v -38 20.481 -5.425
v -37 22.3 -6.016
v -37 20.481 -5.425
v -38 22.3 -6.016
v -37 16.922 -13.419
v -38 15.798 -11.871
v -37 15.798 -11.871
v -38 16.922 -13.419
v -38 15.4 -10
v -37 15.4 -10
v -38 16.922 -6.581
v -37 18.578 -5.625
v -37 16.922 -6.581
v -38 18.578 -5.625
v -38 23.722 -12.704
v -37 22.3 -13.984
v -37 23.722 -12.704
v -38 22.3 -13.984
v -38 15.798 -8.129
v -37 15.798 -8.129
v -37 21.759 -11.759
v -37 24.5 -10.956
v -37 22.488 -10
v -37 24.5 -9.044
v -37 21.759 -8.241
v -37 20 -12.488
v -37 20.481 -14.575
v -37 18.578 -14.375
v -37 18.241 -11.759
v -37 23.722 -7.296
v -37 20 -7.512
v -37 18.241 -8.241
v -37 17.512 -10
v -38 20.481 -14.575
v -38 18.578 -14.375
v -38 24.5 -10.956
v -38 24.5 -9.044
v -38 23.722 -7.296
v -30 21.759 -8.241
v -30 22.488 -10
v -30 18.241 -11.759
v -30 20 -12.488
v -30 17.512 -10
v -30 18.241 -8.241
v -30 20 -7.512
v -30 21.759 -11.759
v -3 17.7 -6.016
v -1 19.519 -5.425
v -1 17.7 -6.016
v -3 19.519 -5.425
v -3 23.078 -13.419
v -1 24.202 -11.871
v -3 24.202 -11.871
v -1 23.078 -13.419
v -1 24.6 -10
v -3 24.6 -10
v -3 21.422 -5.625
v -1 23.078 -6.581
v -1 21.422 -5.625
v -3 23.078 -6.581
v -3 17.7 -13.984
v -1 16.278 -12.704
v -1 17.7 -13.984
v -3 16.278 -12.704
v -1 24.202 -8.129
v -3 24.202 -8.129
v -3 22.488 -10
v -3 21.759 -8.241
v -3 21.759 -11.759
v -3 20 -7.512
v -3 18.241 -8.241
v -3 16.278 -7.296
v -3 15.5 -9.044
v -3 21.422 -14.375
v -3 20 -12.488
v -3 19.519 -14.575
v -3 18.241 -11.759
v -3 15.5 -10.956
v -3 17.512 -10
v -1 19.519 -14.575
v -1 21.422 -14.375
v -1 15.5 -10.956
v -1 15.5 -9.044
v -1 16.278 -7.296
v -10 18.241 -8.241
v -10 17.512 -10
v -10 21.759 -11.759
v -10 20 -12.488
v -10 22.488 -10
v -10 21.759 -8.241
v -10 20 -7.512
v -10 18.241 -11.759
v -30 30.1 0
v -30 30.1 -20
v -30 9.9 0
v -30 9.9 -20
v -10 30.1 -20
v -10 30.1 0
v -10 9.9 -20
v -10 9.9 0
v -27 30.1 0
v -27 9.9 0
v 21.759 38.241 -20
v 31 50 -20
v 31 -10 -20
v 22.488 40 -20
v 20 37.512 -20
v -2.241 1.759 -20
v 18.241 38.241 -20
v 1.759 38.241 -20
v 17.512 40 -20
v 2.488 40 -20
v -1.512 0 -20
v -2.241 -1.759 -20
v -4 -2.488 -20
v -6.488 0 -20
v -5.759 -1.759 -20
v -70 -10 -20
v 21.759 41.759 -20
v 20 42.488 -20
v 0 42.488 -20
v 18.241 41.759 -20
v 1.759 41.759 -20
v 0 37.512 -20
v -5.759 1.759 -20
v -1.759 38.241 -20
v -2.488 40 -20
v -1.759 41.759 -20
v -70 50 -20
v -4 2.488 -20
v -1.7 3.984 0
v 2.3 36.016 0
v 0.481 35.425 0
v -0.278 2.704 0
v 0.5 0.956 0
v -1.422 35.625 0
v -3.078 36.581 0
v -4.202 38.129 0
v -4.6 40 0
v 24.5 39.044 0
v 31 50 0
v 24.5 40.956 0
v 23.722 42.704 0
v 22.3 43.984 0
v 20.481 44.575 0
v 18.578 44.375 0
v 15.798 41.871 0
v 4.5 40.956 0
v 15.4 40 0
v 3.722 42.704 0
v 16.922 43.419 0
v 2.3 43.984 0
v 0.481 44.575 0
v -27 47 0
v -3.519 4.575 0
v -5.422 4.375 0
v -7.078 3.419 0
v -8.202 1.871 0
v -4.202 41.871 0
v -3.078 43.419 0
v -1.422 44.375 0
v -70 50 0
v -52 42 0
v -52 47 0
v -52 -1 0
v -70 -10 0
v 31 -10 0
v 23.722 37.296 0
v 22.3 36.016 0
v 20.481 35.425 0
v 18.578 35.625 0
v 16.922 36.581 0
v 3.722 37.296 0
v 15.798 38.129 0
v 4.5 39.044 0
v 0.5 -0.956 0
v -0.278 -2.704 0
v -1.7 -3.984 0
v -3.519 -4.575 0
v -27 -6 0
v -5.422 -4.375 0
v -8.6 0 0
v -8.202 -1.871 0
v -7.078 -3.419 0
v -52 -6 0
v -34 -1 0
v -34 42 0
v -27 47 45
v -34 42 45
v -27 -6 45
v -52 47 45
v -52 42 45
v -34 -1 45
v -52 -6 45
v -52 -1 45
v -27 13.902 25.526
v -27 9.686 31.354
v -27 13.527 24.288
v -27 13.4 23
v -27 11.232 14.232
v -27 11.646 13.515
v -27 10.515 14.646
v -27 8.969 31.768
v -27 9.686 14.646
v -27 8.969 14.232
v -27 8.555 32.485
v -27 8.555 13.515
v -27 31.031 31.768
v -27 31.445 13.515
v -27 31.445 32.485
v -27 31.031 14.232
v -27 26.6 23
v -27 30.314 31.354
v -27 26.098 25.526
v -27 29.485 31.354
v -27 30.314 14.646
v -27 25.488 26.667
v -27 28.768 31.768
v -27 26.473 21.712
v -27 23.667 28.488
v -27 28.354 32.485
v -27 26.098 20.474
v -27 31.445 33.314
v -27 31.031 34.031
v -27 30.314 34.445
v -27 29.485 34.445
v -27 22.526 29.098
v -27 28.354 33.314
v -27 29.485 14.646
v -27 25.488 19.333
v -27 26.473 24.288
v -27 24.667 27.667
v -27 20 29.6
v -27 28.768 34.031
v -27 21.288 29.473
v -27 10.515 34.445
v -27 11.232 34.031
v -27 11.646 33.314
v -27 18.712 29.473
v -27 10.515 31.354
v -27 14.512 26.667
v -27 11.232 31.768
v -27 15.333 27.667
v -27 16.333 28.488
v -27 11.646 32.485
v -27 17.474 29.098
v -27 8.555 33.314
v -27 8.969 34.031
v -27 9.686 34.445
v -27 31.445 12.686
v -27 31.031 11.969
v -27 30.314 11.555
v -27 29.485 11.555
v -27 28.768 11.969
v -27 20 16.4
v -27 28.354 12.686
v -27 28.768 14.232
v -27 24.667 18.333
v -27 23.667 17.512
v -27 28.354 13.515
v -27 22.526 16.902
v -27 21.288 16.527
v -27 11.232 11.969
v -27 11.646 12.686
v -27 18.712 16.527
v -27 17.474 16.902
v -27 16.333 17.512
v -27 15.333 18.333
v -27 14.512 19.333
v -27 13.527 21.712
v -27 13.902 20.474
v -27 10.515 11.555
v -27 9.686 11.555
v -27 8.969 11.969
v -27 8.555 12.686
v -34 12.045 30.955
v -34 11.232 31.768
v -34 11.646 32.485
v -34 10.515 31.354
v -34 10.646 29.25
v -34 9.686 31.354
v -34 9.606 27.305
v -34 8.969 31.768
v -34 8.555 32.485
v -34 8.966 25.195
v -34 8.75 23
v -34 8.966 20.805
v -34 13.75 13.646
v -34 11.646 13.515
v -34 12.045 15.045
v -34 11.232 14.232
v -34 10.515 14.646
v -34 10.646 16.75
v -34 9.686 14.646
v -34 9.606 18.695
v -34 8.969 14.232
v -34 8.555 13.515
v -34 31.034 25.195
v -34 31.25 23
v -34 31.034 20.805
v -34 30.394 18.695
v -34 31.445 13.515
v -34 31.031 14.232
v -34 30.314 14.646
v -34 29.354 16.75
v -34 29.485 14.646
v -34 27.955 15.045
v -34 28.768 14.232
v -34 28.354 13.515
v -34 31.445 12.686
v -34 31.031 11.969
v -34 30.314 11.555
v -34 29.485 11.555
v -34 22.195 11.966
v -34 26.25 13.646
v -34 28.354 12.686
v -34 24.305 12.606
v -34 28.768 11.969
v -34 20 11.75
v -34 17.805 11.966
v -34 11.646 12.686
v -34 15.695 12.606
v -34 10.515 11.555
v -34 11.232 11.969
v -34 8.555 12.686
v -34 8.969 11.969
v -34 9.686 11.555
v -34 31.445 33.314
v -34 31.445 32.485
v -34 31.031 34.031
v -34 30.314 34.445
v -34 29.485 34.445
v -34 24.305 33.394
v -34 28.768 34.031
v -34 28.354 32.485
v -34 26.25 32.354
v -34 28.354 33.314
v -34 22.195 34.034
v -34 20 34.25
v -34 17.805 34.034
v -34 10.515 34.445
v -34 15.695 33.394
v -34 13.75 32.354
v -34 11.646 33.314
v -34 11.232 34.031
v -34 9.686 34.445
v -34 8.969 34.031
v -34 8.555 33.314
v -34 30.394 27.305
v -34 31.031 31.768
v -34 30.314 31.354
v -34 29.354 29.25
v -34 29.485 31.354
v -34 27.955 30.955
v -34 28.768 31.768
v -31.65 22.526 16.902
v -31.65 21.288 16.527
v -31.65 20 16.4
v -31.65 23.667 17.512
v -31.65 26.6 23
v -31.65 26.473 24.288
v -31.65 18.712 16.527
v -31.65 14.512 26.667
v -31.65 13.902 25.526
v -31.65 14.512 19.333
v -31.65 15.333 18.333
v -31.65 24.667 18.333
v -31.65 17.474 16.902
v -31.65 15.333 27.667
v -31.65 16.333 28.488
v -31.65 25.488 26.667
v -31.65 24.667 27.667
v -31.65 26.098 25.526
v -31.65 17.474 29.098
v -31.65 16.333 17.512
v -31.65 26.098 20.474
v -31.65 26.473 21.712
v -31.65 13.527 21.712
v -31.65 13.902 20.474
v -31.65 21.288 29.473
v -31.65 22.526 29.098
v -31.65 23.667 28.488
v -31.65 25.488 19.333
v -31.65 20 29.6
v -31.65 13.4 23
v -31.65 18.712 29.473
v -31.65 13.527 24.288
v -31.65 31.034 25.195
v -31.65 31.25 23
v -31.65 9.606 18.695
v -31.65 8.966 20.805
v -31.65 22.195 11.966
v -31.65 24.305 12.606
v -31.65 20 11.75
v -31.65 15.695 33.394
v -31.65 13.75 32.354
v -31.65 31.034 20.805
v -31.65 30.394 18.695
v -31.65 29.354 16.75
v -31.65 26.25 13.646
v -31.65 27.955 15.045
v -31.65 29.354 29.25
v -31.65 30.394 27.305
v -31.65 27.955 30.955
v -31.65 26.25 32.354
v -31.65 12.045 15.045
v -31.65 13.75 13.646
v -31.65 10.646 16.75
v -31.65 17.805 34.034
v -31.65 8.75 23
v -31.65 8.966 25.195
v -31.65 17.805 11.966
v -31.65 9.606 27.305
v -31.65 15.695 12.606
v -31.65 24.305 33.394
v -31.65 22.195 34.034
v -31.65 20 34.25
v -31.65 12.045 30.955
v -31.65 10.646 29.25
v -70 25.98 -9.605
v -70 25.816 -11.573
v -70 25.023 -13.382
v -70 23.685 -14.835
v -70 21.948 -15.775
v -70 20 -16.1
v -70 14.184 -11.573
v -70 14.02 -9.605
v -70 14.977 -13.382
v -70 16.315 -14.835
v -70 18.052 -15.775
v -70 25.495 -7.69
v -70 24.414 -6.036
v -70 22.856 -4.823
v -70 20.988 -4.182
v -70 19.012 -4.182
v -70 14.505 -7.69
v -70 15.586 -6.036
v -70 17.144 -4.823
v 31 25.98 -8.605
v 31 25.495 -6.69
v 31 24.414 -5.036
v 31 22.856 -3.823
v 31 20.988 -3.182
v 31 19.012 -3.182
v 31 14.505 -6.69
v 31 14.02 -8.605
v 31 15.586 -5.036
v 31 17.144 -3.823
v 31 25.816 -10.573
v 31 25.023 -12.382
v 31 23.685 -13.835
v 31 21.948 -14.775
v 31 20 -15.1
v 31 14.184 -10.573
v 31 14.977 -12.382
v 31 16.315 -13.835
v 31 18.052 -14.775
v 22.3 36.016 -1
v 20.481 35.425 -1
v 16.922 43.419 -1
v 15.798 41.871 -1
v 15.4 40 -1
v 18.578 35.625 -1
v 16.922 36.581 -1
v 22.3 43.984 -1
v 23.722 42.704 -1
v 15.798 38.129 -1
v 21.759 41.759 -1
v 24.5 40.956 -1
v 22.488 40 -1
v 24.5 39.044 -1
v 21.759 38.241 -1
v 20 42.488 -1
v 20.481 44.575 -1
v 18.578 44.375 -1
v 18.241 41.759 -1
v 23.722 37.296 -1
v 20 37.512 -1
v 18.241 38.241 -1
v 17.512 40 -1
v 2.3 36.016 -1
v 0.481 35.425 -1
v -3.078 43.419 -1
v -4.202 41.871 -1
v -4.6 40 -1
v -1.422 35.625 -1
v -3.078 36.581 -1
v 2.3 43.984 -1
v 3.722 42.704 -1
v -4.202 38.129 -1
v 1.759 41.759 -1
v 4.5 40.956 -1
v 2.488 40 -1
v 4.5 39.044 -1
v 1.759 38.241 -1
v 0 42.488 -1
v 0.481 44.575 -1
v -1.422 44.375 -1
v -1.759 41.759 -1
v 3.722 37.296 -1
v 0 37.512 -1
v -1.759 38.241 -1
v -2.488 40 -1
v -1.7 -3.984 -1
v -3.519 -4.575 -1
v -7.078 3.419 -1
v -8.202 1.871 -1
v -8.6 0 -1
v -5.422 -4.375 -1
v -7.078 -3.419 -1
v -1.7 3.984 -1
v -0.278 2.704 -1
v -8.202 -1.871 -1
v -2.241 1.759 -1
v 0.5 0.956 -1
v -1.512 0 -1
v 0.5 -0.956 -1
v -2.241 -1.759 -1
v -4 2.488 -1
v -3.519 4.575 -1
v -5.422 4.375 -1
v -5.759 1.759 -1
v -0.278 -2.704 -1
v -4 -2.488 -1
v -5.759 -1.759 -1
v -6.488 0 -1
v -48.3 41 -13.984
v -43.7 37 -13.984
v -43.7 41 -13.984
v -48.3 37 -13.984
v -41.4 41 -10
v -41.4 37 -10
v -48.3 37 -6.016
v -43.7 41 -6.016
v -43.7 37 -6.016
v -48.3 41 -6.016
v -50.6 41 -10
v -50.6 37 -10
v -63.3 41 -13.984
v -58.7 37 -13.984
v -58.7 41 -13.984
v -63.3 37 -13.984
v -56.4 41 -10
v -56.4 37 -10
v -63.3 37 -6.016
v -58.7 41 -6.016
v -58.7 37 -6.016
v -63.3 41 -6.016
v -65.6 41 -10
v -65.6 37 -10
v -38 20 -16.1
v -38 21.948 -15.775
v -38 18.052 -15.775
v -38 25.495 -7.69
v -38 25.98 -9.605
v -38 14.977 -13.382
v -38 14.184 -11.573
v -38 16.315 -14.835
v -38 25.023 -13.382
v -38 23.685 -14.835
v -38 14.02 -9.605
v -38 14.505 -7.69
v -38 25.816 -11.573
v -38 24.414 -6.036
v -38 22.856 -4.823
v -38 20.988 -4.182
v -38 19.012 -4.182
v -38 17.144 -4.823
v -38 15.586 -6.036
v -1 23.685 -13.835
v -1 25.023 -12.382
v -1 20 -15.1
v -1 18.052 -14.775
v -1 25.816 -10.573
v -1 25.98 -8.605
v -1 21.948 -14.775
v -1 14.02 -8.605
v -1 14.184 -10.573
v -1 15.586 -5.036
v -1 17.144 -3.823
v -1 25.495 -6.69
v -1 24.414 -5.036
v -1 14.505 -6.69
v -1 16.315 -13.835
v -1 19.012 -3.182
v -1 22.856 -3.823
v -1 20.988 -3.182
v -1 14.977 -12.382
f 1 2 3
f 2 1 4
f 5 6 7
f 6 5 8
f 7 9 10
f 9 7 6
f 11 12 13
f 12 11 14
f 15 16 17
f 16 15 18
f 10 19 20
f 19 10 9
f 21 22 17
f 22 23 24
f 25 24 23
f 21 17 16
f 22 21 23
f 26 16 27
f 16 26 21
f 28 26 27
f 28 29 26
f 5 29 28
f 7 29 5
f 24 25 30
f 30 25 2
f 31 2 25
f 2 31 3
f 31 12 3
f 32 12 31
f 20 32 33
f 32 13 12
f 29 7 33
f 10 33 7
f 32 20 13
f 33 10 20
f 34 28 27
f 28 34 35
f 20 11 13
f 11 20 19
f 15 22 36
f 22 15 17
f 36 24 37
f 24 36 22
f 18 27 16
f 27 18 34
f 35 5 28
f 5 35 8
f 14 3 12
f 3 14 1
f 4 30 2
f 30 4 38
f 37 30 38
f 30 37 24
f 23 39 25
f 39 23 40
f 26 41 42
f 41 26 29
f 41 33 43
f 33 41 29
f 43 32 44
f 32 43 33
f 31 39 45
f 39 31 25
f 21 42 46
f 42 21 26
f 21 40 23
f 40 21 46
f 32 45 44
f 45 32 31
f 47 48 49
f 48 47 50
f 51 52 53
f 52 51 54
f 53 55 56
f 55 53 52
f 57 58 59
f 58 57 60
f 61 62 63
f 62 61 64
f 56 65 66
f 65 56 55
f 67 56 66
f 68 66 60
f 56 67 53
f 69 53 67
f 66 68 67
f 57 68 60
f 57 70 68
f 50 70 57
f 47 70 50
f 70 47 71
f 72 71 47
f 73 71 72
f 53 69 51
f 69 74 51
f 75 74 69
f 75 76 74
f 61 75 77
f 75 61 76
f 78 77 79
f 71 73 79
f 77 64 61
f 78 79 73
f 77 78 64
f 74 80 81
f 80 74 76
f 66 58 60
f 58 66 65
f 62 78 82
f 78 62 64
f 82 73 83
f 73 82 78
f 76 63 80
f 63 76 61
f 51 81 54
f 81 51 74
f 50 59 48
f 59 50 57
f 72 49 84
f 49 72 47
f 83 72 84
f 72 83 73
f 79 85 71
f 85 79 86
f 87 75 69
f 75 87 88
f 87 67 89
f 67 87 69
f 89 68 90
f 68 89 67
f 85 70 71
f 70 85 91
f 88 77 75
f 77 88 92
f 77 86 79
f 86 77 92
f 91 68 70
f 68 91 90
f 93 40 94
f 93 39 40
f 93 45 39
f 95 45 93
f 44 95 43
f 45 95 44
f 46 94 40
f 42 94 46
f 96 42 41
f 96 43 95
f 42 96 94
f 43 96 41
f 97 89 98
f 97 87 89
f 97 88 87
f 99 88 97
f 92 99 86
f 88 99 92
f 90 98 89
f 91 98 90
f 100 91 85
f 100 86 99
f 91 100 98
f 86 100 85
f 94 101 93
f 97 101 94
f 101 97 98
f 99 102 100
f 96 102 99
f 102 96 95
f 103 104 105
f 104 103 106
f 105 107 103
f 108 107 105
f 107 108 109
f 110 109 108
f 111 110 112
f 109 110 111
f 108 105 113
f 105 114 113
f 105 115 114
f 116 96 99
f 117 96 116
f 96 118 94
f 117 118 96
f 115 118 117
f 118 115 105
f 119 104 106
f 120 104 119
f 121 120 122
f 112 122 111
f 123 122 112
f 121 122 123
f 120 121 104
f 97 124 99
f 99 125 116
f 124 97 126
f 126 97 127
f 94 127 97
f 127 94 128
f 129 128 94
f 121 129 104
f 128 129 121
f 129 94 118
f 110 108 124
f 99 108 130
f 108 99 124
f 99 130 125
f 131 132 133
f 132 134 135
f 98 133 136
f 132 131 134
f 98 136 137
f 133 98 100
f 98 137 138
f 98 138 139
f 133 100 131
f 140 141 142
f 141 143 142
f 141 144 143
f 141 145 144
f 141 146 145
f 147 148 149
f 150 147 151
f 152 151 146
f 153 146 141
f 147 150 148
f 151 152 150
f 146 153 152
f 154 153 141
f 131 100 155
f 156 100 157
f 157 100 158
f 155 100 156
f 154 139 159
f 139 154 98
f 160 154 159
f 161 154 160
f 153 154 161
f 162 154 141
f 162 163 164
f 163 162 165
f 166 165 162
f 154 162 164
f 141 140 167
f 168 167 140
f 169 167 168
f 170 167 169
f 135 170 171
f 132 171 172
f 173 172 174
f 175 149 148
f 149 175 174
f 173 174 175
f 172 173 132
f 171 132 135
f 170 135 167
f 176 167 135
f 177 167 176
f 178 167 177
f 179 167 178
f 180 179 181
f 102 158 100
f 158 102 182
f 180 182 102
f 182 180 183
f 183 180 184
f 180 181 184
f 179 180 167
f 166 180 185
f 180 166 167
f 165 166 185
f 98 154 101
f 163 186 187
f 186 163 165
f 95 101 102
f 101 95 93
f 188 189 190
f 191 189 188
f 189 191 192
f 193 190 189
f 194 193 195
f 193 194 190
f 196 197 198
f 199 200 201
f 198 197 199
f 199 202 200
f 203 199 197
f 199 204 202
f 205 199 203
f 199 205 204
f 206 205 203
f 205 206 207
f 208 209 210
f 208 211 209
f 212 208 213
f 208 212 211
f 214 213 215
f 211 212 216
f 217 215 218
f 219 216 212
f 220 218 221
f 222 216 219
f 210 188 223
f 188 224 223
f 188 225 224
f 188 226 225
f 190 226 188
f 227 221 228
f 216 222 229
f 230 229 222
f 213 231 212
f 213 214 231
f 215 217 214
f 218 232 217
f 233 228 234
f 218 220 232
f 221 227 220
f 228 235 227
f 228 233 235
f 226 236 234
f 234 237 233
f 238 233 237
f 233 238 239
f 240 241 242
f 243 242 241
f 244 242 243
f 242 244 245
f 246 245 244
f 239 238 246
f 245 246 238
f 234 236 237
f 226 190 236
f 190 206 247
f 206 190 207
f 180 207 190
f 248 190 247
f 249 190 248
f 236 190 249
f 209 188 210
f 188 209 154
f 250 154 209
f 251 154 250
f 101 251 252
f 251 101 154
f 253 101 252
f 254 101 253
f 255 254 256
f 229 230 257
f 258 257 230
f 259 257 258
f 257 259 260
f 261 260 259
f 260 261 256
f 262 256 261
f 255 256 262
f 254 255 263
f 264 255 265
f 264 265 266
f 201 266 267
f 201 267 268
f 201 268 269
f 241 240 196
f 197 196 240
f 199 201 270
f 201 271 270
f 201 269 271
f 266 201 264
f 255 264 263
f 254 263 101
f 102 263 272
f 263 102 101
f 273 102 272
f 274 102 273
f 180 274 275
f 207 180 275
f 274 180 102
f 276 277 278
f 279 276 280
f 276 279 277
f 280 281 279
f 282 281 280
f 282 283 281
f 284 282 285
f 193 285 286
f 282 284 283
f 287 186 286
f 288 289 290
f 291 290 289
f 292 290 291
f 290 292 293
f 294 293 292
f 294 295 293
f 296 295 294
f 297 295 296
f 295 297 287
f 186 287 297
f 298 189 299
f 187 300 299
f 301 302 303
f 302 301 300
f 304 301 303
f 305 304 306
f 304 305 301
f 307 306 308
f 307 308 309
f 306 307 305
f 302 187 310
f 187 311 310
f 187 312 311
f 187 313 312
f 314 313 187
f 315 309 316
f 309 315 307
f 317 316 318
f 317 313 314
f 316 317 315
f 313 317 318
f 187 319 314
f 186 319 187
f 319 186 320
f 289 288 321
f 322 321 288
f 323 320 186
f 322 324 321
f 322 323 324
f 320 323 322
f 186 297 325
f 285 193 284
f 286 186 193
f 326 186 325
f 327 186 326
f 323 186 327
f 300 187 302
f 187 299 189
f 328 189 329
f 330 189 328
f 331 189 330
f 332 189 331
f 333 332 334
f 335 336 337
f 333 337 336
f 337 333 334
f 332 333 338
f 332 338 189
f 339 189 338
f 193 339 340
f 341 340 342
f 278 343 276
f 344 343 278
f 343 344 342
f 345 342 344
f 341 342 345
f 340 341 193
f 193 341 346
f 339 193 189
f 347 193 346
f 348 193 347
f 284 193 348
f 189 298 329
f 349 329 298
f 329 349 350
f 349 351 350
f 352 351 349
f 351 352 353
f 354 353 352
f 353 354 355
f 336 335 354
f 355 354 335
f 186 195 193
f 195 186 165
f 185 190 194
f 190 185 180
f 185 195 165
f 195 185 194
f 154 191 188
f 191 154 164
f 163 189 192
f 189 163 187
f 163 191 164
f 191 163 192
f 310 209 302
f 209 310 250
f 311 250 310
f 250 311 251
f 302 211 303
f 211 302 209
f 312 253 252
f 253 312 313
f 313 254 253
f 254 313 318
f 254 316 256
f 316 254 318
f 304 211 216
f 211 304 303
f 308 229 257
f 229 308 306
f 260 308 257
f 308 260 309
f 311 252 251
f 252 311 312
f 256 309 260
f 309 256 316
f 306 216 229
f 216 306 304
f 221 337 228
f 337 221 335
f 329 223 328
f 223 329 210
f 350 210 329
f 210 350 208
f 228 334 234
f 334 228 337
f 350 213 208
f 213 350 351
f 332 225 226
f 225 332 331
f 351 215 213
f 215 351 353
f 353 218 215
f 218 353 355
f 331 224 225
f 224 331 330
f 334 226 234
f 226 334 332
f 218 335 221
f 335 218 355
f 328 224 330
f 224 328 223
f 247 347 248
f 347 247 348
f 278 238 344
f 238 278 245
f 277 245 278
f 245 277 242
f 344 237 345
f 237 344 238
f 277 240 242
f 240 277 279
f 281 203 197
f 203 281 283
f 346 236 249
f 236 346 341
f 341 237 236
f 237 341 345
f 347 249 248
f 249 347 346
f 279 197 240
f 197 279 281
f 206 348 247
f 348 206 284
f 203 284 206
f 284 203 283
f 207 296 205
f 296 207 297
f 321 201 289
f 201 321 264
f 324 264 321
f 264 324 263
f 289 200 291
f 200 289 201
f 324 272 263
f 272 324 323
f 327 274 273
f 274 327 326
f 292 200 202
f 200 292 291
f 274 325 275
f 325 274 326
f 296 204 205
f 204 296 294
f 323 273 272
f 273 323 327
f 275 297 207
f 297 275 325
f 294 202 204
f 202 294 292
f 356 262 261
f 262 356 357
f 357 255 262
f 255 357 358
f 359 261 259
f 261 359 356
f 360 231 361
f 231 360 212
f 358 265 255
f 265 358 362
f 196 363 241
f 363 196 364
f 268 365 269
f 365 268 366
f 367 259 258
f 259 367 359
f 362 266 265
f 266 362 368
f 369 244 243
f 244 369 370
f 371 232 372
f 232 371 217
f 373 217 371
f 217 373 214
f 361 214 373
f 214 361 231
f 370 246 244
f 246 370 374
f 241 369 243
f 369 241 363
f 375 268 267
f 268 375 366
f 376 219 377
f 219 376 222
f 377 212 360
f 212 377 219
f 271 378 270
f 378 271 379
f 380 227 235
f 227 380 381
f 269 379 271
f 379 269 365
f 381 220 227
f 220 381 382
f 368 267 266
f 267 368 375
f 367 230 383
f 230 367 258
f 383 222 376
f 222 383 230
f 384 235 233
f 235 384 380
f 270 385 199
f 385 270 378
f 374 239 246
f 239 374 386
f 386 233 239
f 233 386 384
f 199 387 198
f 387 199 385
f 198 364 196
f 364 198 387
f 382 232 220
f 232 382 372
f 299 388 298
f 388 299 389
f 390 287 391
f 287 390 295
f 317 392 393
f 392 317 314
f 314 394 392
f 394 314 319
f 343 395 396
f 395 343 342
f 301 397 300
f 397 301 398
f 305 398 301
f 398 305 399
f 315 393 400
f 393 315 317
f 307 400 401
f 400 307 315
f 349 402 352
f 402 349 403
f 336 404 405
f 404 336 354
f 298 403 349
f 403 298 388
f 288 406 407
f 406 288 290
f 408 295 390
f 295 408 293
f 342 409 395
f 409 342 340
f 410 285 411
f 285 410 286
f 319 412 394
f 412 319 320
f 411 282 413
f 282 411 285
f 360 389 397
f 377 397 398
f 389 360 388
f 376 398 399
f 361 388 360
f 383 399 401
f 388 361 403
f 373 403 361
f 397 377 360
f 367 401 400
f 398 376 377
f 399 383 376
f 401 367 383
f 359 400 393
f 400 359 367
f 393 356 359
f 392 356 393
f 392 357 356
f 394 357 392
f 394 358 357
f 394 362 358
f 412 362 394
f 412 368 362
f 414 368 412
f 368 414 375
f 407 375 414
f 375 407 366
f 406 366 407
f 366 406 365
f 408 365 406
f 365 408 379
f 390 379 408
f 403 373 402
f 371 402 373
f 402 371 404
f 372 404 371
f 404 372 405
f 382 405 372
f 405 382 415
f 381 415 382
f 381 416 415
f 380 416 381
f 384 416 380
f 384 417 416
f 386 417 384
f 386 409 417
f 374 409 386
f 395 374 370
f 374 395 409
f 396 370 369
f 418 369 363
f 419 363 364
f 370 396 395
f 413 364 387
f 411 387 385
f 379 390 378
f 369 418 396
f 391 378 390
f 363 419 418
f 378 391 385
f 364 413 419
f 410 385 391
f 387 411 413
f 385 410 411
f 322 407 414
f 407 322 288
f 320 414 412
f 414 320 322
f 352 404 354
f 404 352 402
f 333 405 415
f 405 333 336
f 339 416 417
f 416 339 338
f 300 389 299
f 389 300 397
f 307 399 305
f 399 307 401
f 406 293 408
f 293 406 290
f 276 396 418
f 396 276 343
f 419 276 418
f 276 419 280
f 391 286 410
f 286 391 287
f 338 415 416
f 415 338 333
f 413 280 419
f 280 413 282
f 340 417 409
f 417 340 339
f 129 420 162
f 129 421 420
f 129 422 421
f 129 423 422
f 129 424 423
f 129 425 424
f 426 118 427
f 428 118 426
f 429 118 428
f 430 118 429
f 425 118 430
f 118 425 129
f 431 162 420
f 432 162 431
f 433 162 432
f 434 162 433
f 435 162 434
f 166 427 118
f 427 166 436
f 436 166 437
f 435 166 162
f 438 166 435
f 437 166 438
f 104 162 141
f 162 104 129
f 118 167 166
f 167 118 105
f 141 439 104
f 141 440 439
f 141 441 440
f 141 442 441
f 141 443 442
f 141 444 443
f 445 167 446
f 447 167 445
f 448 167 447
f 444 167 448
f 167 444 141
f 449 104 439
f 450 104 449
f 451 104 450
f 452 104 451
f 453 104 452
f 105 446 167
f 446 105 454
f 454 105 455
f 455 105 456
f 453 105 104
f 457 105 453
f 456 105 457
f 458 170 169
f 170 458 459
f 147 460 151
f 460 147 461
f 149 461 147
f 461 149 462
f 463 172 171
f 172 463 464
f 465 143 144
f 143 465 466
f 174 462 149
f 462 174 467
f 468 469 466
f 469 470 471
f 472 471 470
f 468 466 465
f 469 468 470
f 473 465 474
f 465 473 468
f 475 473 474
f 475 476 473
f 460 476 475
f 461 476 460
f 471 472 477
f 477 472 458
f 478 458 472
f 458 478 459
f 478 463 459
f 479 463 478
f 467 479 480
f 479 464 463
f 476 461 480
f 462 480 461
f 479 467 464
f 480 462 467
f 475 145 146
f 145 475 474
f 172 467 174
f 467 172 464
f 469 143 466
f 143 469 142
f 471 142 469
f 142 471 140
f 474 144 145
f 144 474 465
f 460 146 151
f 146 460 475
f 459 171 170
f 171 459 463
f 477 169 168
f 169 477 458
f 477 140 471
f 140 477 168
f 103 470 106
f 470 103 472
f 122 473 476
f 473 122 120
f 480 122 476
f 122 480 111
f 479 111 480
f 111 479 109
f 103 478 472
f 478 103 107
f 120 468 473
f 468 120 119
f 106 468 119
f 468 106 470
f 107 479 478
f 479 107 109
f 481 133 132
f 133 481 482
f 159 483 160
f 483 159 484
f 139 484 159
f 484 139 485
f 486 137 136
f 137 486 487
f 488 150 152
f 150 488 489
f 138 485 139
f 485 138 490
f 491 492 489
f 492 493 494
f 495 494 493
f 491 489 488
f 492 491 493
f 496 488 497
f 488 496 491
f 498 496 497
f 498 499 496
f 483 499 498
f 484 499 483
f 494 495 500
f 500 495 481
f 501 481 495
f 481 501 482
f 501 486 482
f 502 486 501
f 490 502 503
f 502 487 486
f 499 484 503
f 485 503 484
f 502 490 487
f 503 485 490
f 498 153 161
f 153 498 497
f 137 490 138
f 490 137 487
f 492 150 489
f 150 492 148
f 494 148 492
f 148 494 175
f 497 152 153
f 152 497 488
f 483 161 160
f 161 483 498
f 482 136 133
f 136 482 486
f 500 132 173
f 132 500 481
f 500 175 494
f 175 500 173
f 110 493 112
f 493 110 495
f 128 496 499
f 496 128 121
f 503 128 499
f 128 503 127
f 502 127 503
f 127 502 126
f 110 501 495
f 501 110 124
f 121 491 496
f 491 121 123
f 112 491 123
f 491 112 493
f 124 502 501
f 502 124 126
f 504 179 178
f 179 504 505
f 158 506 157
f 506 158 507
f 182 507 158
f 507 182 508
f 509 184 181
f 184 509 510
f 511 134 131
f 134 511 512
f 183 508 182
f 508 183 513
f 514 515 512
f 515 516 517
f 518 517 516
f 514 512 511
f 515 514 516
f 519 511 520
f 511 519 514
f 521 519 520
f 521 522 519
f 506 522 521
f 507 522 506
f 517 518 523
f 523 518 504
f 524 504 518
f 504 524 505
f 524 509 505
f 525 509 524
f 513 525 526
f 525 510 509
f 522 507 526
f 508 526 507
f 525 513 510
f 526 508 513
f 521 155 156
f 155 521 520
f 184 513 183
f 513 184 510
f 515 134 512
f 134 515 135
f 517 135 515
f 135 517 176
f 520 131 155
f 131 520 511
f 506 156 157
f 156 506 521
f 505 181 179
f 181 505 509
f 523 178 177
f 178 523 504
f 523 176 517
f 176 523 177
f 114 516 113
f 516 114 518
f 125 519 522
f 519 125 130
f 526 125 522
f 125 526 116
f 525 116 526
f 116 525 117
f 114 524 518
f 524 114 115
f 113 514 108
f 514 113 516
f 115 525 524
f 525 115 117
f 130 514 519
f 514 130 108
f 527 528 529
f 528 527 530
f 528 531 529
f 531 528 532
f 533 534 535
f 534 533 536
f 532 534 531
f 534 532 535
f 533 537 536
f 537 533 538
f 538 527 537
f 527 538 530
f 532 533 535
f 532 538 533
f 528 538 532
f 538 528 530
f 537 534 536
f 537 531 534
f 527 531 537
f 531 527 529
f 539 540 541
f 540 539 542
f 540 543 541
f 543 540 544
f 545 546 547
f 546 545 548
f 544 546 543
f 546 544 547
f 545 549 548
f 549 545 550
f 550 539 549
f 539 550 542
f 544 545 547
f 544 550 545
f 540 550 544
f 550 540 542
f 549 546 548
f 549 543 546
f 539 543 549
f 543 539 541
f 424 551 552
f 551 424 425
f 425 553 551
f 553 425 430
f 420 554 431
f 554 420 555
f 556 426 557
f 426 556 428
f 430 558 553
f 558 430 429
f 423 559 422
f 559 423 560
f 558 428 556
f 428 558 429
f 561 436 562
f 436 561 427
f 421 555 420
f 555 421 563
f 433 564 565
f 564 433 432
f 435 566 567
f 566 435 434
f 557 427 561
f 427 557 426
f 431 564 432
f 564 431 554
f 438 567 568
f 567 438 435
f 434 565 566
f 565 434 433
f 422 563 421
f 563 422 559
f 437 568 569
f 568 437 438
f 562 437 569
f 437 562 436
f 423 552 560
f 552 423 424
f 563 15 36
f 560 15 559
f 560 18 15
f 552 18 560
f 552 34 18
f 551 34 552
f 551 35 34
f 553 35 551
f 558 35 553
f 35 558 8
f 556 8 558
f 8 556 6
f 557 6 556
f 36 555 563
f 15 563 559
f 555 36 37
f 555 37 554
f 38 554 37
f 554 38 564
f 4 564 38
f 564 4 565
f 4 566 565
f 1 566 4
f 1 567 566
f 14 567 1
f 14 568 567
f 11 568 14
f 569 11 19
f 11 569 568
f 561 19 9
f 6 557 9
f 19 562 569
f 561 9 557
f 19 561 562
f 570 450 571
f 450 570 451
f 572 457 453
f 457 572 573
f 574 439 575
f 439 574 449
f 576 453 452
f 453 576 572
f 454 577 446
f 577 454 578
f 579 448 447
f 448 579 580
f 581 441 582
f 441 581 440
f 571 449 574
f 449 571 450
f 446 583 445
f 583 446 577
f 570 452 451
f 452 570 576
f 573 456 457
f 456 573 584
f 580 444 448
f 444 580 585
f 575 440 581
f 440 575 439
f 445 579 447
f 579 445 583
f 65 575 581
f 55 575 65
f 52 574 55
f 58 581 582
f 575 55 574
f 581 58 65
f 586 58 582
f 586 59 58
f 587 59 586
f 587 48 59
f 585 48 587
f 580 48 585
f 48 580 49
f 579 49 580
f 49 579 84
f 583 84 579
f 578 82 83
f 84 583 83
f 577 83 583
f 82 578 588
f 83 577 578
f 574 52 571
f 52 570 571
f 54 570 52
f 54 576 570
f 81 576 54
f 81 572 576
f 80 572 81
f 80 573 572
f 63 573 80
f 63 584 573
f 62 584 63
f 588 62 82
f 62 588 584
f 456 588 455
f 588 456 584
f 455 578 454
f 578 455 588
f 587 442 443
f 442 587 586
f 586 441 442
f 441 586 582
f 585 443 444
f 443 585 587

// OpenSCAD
// file: MCAD/constants.scad
// MIT license


TAU = 6.2831853071; //2*PI, see http://tauday.com/
PI = TAU/2;

// translates a imperial measurement in inches to meters
mm_per_inch = 25.4;
// file: MCAD/math.scad
// MIT license

include <constants.scad>

function deg(angle) = 360*angle/TAU;
// file: bom.scad
module bom(code, desc, category) {
	echo(str("BOM: ",code," - ", desc, "; ", category));
}
// file: MCAD/shapes.scad
/*
 *  OpenSCAD Shapes Library (www.openscad.org)
 *  Copyright (C) 2009  Catarina Mota
 *  Copyright (C) 2010  Elmo Mäntynen
 *
 *  License: LGPL 2.1 or later
*/

// 2D Shapes
//ngon(sides, radius, center=false);

// 3D Shapes
//box(width, height, depth);
//roundedBox(width, height, depth, factor);
//cone(height, radius);
//ellipticalCylinder(width, height, depth);
//ellipsoid(width, height);
//tube(height, radius, wall, center = false);
//tube2(height, ID, OD, center = false);
//ovalTube(width, height, depth, wall, center = false);
//hexagon(height, depth);
//octagon(height, depth);
//dodecagon(height, depth);
//hexagram(height, depth);
//rightTriangle(adjacent, opposite, depth);
//equiTriangle(side, depth);
//12ptStar(height, depth);

//----------------------

// size is a vector [w, h, d]
module box(width, height, depth) {
  cube([width, height, depth], true);
}

// size is a vector [w, h, d]
module roundedBox(width, height, depth, radius) {
  size=[width, height, depth];
  cube(size - [2*radius,0,0], true);
  cube(size - [0,2*radius,0], true);
  for (x = [radius-size[0]/2, -radius+size[0]/2],
       y = [radius-size[1]/2, -radius+size[1]/2]) {
    translate([x,y,0]) cylinder(r=radius, h=size[2], center=true);
  }
}

module cone(height, radius, center = false) {
  cylinder(height, radius, 0, center);
}

module ellipticalCylinder(w,h, height, center = false) {
  scale([1, h/w, 1]) cylinder(h=height, r=w, center=center);
}

module ellipsoid(w, h, center = false) {
  scale([1, h/w, 1]) sphere(r=w/2, center=center);
}

// wall is wall thickness
module tube(height, radius, wall, center = false) {
  difference() {
    cylinder(h=height, r=radius, center=center);
    cylinder(h=height, r=radius-wall, center=center);
  }
}

// wall is wall thickness
module tube2(height, ID, OD, center = false) {
  difference() {
    cylinder(h=height, r=OD/2, center=center);
    cylinder(h=height, r=ID/2, center=center);
  }
}

// wall is wall thickness
module ovalTube(height, rx, ry, wall, center = false) {
  difference() {
    scale([1, ry/rx, 1]) cylinder(h=height, r=rx, center=center);
    scale([(rx-wall)/rx, (ry-wall)/rx, 1]) cylinder(h=height, r=rx, center=center);
  }
}

// size is the XY plane size, height in Z
module hexagon(size, height) {
  boxWidth = size/1.75;
  for (r = [-60, 0, 60]) rotate([0,0,r]) cube([boxWidth, size, height], true);
}

// size is the XY plane size, height in Z
module octagon(size, height) {
  intersection() {
    cube([size, size, height], true);
    rotate([0,0,45]) cube([size, size, height], true);
  }
}

// size is the XY plane size, height in Z
module dodecagon(size, height) {
  intersection() {
    hexagon(size, height);
    rotate([0,0,90]) hexagon(size, height);
  }
}

// size is the XY plane size, height in Z
module hexagram(size, height) {
  boxWidth=size/1.75;
  for (v = [[0,1],[0,-1],[1,-1]]) {
    intersection() {
      rotate([0,0,60*v[0]]) cube([size, boxWidth, height], true);
      rotate([0,0,60*v[1]]) cube([size, boxWidth, height], true);
    }
  }
}

module rightTriangle(adjacent, opposite, height) {
  difference() {
    translate([-adjacent/2,opposite/2,0]) cube([adjacent, opposite, height], true);
    translate([-adjacent,0,0]) {
      rotate([0,0,atan(opposite/adjacent)]) dislocateBox(adjacent*2, opposite, height+2);
    }
  }
}

module equiTriangle(side, height) {
  difference() {
    translate([-side/2,side/2,0]) cube([side, side, height], true);
    rotate([0,0,30]) dislocateBox(side*2, side, height);
    translate([-side,0,0]) {
      rotate([0,0,60]) dislocateBox(side*2, side, height);
    }
  }
}

module 12ptStar(size, height) {
  starNum = 3;
  starAngle = 360/starNum;
  for (s = [1:starNum]) {
    rotate([0, 0, s*starAngle]) cube([size, size, height], true);
  }
}

//-----------------------
//MOVES THE ROTATION AXIS OF A BOX FROM ITS CENTER TO THE BOTTOM LEFT CORNER
module dislocateBox(w, h, d) {
  translate([0,0,-d/2]) cube([w,h,d]);
}

//-----------------------
// Tests
//module test2D_ellipse(){ellipse(10, 5);}
module test_ellipsoid(){ellipsoid(10, 5);}

//module test2D_egg_outline(){egg_outline();}
// file: MCAD/motors.scad
// Copyright 2010 D1plo1d

// This library is dual licensed under the GPL 3.0 and the GNU Lesser General Public License as per http://creativecommons.org/licenses/LGPL/2.1/ .

include <math.scad>


//generates a motor mount for the specified nema standard #.
module stepper_motor_mount(nema_standard,slide_distance=0, mochup=true, tolerance=0) {
	//dimensions from:
	// http://www.numberfactory.com/NEMA%20Motor%20Dimensions.htm
	if (nema_standard == 17)
	{
		_stepper_motor_mount(
			motor_shaft_diameter = 0.1968*mm_per_inch,
			motor_shaft_length = 0.945*mm_per_inch,
			pilot_diameter = 0.866*mm_per_inch,
			pilot_length = 0.80*mm_per_inch,
			mounting_bolt_circle = 1.725*mm_per_inch,
			bolt_hole_size = 3.5,
			bolt_hole_distance = 1.220*mm_per_inch,
			slide_distance = slide_distance,
			mochup = mochup,
			tolerance=tolerance);
	}
	if (nema_standard == 23)
	{
		_stepper_motor_mount(
			motor_shaft_diameter = 0.250*mm_per_inch,
			motor_shaft_length = 0.81*mm_per_inch,
			pilot_diameter = 1.500*mm_per_inch,
			pilot_length = 0.062*mm_per_inch,
			mounting_bolt_circle = 2.625*mm_per_inch,
			bolt_hole_size = 0.195*mm_per_inch,
			bolt_hole_distance = 1.856*mm_per_inch,
			slide_distance = slide_distance,
			mochup = mochup,
			tolerance=tolerance);
	}
	
}


//inner mehod for creating a stepper motor mount of any dimensions
module _stepper_motor_mount(
	motor_shaft_diameter,
	motor_shaft_length,
	pilot_diameter,
	pilot_length,
	mounting_bolt_circle,
	bolt_hole_size,
	bolt_hole_distance,
	slide_distance = 0,
	motor_length = 40, //arbitray - not standardized
	mochup,
	tolerance = 0
)
{
	union()
	{
	// == centered mount points ==
	//mounting circle inset
	translate([0,slide_distance/2,0]) circle(r = pilot_diameter/2 + tolerance);
	square([pilot_diameter,slide_distance],center=true);
	translate([0,-slide_distance/2,0]) circle(r = pilot_diameter/2 + tolerance);

	//todo: motor shaft hole
	
	//mounting screw holes
	for (x = [-1,1])
	{
		for (y = [-1,1])
		{
			translate([x*bolt_hole_distance/2,y*bolt_hole_distance/2,0])
			{
				translate([0,slide_distance/2,0]) circle(bolt_hole_size/2 + tolerance);
				translate([0,-slide_distance/2,0]) circle(bolt_hole_size/2 + tolerance);
				square([bolt_hole_size+2*tolerance,slide_distance],center=true);
			}
		}
	}
	// == motor mock-up ==
	//motor box
	if (mochup == true)
	{
		%translate([0,0,-5]) cylinder(h = 5, r = pilot_diameter/2);
		%translate(v=[0,0,-motor_length/2])
		{
			cube(size=[bolt_hole_distance+bolt_hole_size+5,bolt_hole_distance+bolt_hole_size+5,motor_length], center = true);
		}
		//shaft
		%translate(v=[0,0,-(motor_length-motor_shaft_length-2)/2])
		{
			%cylinder(r=motor_shaft_diameter/2,h=motor_length+motor_shaft_length--1, center = true);
		}
	}
	}
}
// file: MCAD/materials.scad
/*
 * Material colors.
 * 
 * Originally by Hans Häggström, 2010.
 * Dual licenced under Creative Commons Attribution-Share Alike 3.0 and LGPL2 or later
 */

// Material colors
Oak = [0.65, 0.5, 0.4];
Pine = [0.85, 0.7, 0.45];
Birch = [0.9, 0.8, 0.6];
FiberBoard = [0.7, 0.67, 0.6];
BlackPaint = [0.2, 0.2, 0.2];
Iron = [0.36, 0.33, 0.33];
Steel = [0.65, 0.67, 0.72];
Stainless = [0.45, 0.43, 0.5];
Aluminum = [0.77, 0.77, 0.8];
Brass = [0.88, 0.78, 0.5];
Transparent = [1, 1, 1, 0.2];

// Example, uncomment to view
//color_demo();

module color_demo(){
    // Wood
    colorTest(Oak, 0, 0);
    colorTest(Pine, 1, 0);
    colorTest(Birch, 2, 0);

    // Metals
    colorTest(Iron, 0, 1);
    colorTest(Steel, 1, 1);
    colorTest(Stainless, 2, 1);
    colorTest(Aluminum, 3, 1);

    // Mixboards
    colorTest(FiberBoard, 0, 2);

    // Paints
    colorTest(BlackPaint, 0, 3);
}

module colorTest(col, row=0, c=0) {
  color(col) translate([row * 30,c*30,0]) sphere(r=10);
}
// file: MCAD/units.scad
/*
 * Basic units.
 * 
 * Originally by Hans Häggström, 2010.
 * Dual licenced under Creative Commons Attribution-Share Alike 3.0 and LGPL2 or later
 */


mm = 1;
cm = 10 * mm;
dm = 100 * mm;
m = 1000 * mm;

inch = 25.4 * mm;

X = [1, 0, 0];
Y = [0, 1, 0];
Z = [0, 0, 1];

M3 = 3*mm;
M4 = 4*mm;
M5 = 5*mm;
M6 = 6*mm;
M8 = 8*mm;


// When a small distance is needed to overlap shapes for boolean cutting, etc.
epsilon = 0.01*mm;
// file: vslot.scad
include <MCAD/units.scad>;
include <MCAD/materials.scad>
use <MCAD/shapes.scad>;
use <bom.scad>;

vslot_color_black = [0.27, 0.27, 0.3];
vslot_color = Aluminum;

module vslot(length=50, sections=1, finish, cutout=0) {
	size = sections * 20;
	bom(str("vslot20x", size, "x", length), str("v-slot 20x", size, " (", length , "mm)"), ["rail", "extrusion", "structure"]);
	cutext = [[12.00,4.50],[10.00,4.50],[8.20,2.78],[8.20,5.50],[6.56,5.50],[3.90,2.84],[3.90,0.21],[3.69,0.00],[3.90,-0.21],[3.90,-2.84],[6.56,-5.50],[8.20,-5.50],[8.20,-2.78],[10.00,-4.50],[12.00,-4.50]];
	cutint = [[16.10,0.21],[16.10,2.84],[12.70,6.24],[12.70,8.78],[7.30,8.78],[7.30,6.24],[3.90,2.84],[3.90,0.21],[3.69,0.00],[3.90,-0.21],[3.90,-2.84],[7.30,-6.24],[7.30,-8.78],[12.70,-8.78],[12.70,-6.24],[16.10,-2.84],[16.10,-0.21],[16.31,0.00],];
	cutcorner = [[8.20,8.20],[6.57,8.20],[6.57,7.66],[7.66,6.57],[8.20,6.57]];

	module profile() {
        
		difference() {
         
			translate([0,0,length/2])
			roundedBox(20 * sections, 20, length, 1.5);
         if (cutout == 0){
			for(i = [0,180]) rotate([0,0,-i]) translate([10 * (sections - 1), 0, -epsilon/2]) {
				linear_extrude(length+20) polygon(cutext);
				translate([5,-2.89,-20]) cube([10,5.78,length+40]);
			}
          
			for(i = [90,270]) rotate([0,0,-i])
				for(j = [0:sections-1]) translate([0, (sections - 1) * 10 - 20 * j, -epsilon/2]) {
					linear_extrude(length+epsilon) polygon(cutext);
					translate([5,-2.89,-20]) cube([10,5.78,length+40]);
				}

			for(i = [0:sections-1]) translate([i * 20 - 10 * (sections - 1),0,-epsilon/2])
				cylinder(length+20, 2.1, 2.1);

			for(i = [90,270]) rotate([0,0,-i])
				translate([0,(sections - 1) * 10,-epsilon/2])
				linear_extrude(length+epsilon) polygon(cutcorner);
			for(i = [ 0,180]) rotate([0,0,-i])
				translate([(sections - 1) * 10,0,-epsilon/2])
				linear_extrude(length+epsilon) polygon(cutcorner);

			if(sections > 1)
				for(i = [0:sections-2]) translate([(sections - 3) * 10 - i * 20, 0, -epsilon/2])
					linear_extrude(length+epsilon) polygon(cutint);
                      }
		}
	}

      if (cutout == 1){
		 translate([0,0,length/2]) box(20 * sections, 20.2, length);
          } else {
	     if(finish)
		   color(finish) profile();
	     else
		   color(vslot_color) profile();
         }
}

module vslot20x20(length, finish) { vslot(length, 1, finish); }
module vslot20x20_cutout(length, finish) { vslot(length, 1, finish, 1); }


module vslot20x40(length, finish) { vslot(length, 2, finish); }
module vslot20x40_cutout(length, finish) { vslot(length, 2, finish, 1); }

module vslot20x60(length, finish) { vslot(length, 3, finish); }
module vslot20x60_cutout(length, finish) { vslot(length, 3, finish, 1); }

module vslot20x80(length, finish) { vslot(length, 4, finish); }
module vslot20x80_cutout(length, finish) { vslot(length, 4, finish, 1); }


module vslot_test() {
	$fn = 32;

	vslot20x20(100);

	translate([0, 40, 0])
	vslot20x40(100, vslot_color_black);

	translate([0, 80, 0])
	vslot20x60(100);

	translate([0, 120, 0])
	vslot20x80(100, vslot_color_black);

    translate([0,140,0]) vslot20x20_cutout(100);
}

vslot_test();
// file: MCAD/nuts_and_bolts.scad
// Copyright 2010 D1plo1d

// This library is dual licensed under the GPL 3.0 and the GNU Lesser General Public License as per http://creativecommons.org/licenses/LGPL/2.1/ .

//testNutsAndBolts();

module SKIPtestNutsAndBolts()
{
	$fn = 360;
	translate([0,15])nutHole(3, proj=2);
	boltHole(3, length= 30, proj=2);
}

MM = "mm";
INCH = "inch"; //Not yet supported

//Based on: http://www.roymech.co.uk/Useful_Tables/Screws/Hex_Screws.htm
METRIC_NUT_AC_WIDTHS =
[
	-1, //0 index is not used but reduces computation
	-1,
	-1,
	6.40,//m3
	8.10,//m4
	9.20,//m5
	11.50,//m6
	-1,
	15.00,//m8
	-1,
	19.60,//m10
	-1,
	22.10,//m12
	-1,
	-1,
	-1,
	27.70,//m16
	-1,
	-1,
	-1,
	34.60,//m20
	-1,
	-1,
	-1,
	41.60,//m24
	-1,
	-1,
	-1,
	-1,
	-1,
	53.1,//m30
	-1,
	-1,
	-1,
	-1,
	-1,
	63.5//m36
];
METRIC_NUT_THICKNESS =
[
	-1, //0 index is not used but reduces computation
	-1,
	-1,
	2.40,//m3
	3.20,//m4
	4.00,//m5
	5.00,//m6
	-1,
	6.50,//m8
	-1,
	8.00,//m10
	-1,
	10.00,//m12
	-1,
	-1,
	-1,
	13.00,//m16
	-1,
	-1,
	-1,
	16.00//m20
	-1,
	-1,
	-1,
	19.00,//m24
	-1,
	-1,
	-1,
	-1,
	-1,
	24.00,//m30
	-1,
	-1,
	-1,
	-1,
	-1,
	29.00//m36
];

COURSE_METRIC_BOLT_MAJOR_THREAD_DIAMETERS =
[//based on max values
	-1, //0 index is not used but reduces computation
	-1,
	-1,
	2.98,//m3
	3.978,//m4
	4.976,//m5
	5.974,//m6
	-1,
	7.972,//m8
	-1,
	9.968,//m10
	-1,
	11.966,//m12
	-1,
	-1,
	-1,
	15.962,//m16
	-1,
	-1,
	-1,
	19.958,//m20
	-1,
	-1,
	-1,
	23.952,//m24
	-1,
	-1,
	-1,
	-1,
	-1,
	29.947,//m30
	-1,
	-1,
	-1,
	-1,
	-1,
	35.940//m36
];

module nutHole(size, units=MM, tolerance = +0.0001, proj = -1)
{
	//takes a metric screw/nut size and looksup nut dimensions
	radius = METRIC_NUT_AC_WIDTHS[size]/2+tolerance;
	height = METRIC_NUT_THICKNESS[size]+tolerance;
	if (proj == -1)
	{
		cylinder(r= radius, h=height, $fn = 6, center=[0,0]);
	}
	if (proj == 1)
	{
		circle(r= radius, $fn = 6);
	}
	if (proj == 2)
	{
		translate([-radius/2, 0])
			square([radius*2, height]);
	}
}

module boltHole(size, units=MM, length, tolerance = +0.0001, proj = -1)
{
	radius = COURSE_METRIC_BOLT_MAJOR_THREAD_DIAMETERS[size]/2+tolerance;
//TODO: proper screw cap values
	capHeight = METRIC_NUT_THICKNESS[size]+tolerance; //METRIC_BOLT_CAP_HEIGHTS[size]+tolerance;
	capRadius = METRIC_NUT_AC_WIDTHS[size]/2+tolerance; //METRIC_BOLT_CAP_RADIUS[size]+tolerance;

	if (proj == -1)
	{
	translate([0, 0, -capHeight])
		cylinder(r= capRadius, h=capHeight);
	cylinder(r = radius, h = length);
	}
	if (proj == 1)
	{
		circle(r = radius);
	}
	if (proj == 2)
	{
		translate([-capRadius/2, -capHeight])
			square([capRadius*2, capHeight]);
		square([radius*2, length]);
	}
}
// file: nemamount.scad
include <MCAD/units.scad>;
include <MCAD/materials.scad>
include <MCAD/stepper.scad>
include <MCAD/motors.scad>
use <MCAD/shapes.scad>;
$fn = 32;




module motor_support(ht)
{
   difference(){
	  translate([-22.5,23.5,0]) rotate([90,0,0]) motor_support_body(ht);
      translate([0,1,0]) rotate([90,0,0]) motor_support_cuts(ht);
      }
}

module motor_support_body(ht)
{
	cube([45,ht,48.5]);

}


module motor_support_cuts(ht)
{
// Motor shaft/pulley cutout.
      translate([0,.1,0]) rotate([90, 0, 0]) cylinder(r=12, h=ht*2, center=true, $fn=60);
      // NEMA 17 stepper motor mounting screws.
      for (x = [-1, 1]) for (z = [-1, 1]) {
        scale([x, 1, z]) translate([15.5, .1, 15.5]) {
          rotate([90, 0, 0]) cylinder(r=4, h=ht*2, center=true, $fn=12);
          }
        }
}



module nema_geared_cutout()
{
    //pulley opening
    translate([16,1,21]) rotate([90,0,0]){
      cylinder (h=22, r=6.6);

      rotate([0,0,45]) {
        translate([14,0,0]) cylinder(h=22, r=1.6, $fn=12);
        translate([0,14,0]) cylinder(h=22, r=1.6, $fn=12);
        translate([-14,0,0]) cylinder(h=22, r=1.6, $fn=12);
        translate([0,-14,0]) cylinder(h=22, r=1.6, $fn=12);
      }
     
    }

    //gearhead indentation
    translate([16,-5,21]) rotate([90,0,0]) cylinder (h=3.35, r=11.25);

  
    
}

module nema_cutout()
{
// Motor shaft/pulley cutout.
      rotate([90, 0, 0]) cylinder(r=12, h=20, center=true, $fn=60);
      // NEMA 17 stepper motor mounting screws.
      for (x = [-1, 1]) for (z = [-1, 1]) {
        scale([x, 1, z]) translate([15.5, -5, 15.5]) {
          rotate([90, 0, 0]) cylinder(r=1.65, h=20, center=true, $fn=12);
          }
        }
}

module nema_motor()
{
   union(){
     nema_mount();
     %translate([0,-4,1]) rotate([90,0,0]) motor(Nema17, size=NemaLong , dualAxis=false);
     }
}

module nema_motor_inverse()
{
   union(){
     nema_mount_inverse();
     %translate([0,-4,1]) rotate([90,0,0]) motor(Nema17, size=NemaLong , dualAxis=false);
     }
}

module nema_geared_motor_inverse()
{
   union(){
     nema_geared_inverse();
     %translate([16,-7,22]) rotate([90,0,180]) motor(Nema17, NemaLong, dualAxis=false);
    
     }
}

module nema_geared_motor()
{
   union(){
     nema_geared_mount();
     %translate([16,-7,22]) rotate([90,0,180]) motor(Nema17, NemaLong, dualAxis=false);
    
     }
}

module nema_geared_mount()
{
   difference(){
      union(){
           translate([-6,-6,0]) rotate([90,0,0]) cube([45,45,7]);
           translate([-6,-13,-4]) rotate([0,0,0]) cube([45,25,5]);
           translate([-6,-13,44]) rotate([0,0,0]) cube([45,25,5]);
           }
      translate([0,0,1]) nema_geared_cutout();
      }


}

module nema_geared_inverse()
{
   difference(){
      union(){
           translate([-6,-6,0]) rotate([90,0,0]) cube([45,45,7]);
           translate([-6,-31,-4]) rotate([0,0,0]) cube([45,25,5]);
           translate([-6,-31,44]) rotate([0,0,0]) cube([45,25,5]);
           }
      translate([0,0,1]) nema_geared_cutout();
      }


}

module nema_mount_inverse()
{
   difference(){
      union(){
        translate([-22.5,0,-21.5]) rotate([90,0,0]) cube([45,45,5]);
        translate([-22.5,-5,-25]) rotate([0,0,0]) cube([45,25,5]);
        }
      translate([0,0,1]) nema_cutout();
      }
   //nema_cutout();
}

module nema_mount()
{
   difference(){
      union(){
        translate([-22.5,0,-21.5]) rotate([90,0,0]) cube([45,45,5]);
        translate([-22.5,-25,-25]) rotate([0,0,0]) cube([45,25,5]);
        }
      translate([0,0,1]) nema_cutout();
      }
   //nema_cutout();
}

//nema_motor_inverse();
translate([0,0,40]) rotate([270,0,0]) nema_motor();
translate([0,0,0]) motor_support(40);
//nema_geared_motor();
//nema_geared_motor_inverse();
// file: mountblock.scad
use <vslot.scad>;
use <MCAD/nuts_and_bolts.scad>;


module mountblock_body()
{
	cube([40,40,20]);
	translate([20,20,0]) %vslot20x20(200);
     %translate([37,20,10]) rotate([90,0,270]) boltHole(5, length=18);
     %translate([3,20,10]) rotate([90,0,90]) boltHole(5, length=18);
}


module mountblock_cuts()
{
	translate([20,20,-0.2]) vslot20x20_cutout(80.1);
    translate([37,20,10]) rotate([90,0,270]) boltHole(5, length=18);
    translate([3,20,10]) rotate([90,0,90]) boltHole(5, length=18);
}


module mountblock()
{
	difference(){
         mountblock_body();
         mountblock_cuts();
         }

}


mountblock();
// main file
use <mountblock.scad>;
use <nemamount.scad>;
use <MCAD/nuts_and_bolts.scad>;

module zmotor_body()
{
    translate([0,0,0]) rotate([0,180,0]) mountblock();
	translate([-40,-2,39]) rotate([0,90,90]) nema_geared_motor();
    translate([-70,-10,-20]) cube([31,60,20]);
    translate([-41,-10,-20]) cube([41,10,20]);
    translate([-41,40,-20]) cube([41,10,20]);
    translate([0,-10,-20]) cube([31,60,20]);
    %translate([-46,41,-10]) rotate([90,0,0]) nutHole(5);
    
   // %translate([-38,20,-10.1]) rotate([0,90,180]) cylinder(r=6,h=33);
    
    %translate([20,40,-1]) rotate([0,180,0]) boltHole(5,length=30);
    %translate([ 0,40,-1]) rotate([0,180,0]) boltHole(5,length=30);
    %translate([-4,0,-1]) rotate([0,180,0]) boltHole(5,length=50);
   // %translate([-1,20,-9.1]) rotate([0,90,0]) cylinder(r=6,h=34);
}

module zmotor_cuts()
{
    translate([-46,41,-10]) rotate([90,0,0]) nutHole(5);
    translate([-61,41,-10]) rotate([90,0,0]) nutHole(5);
    translate([20,40,-1]) rotate([0,180,0]) boltHole(5,length=30);
    translate([ 0,40,-1]) rotate([0,180,0]) boltHole(5,length=30);
    translate([-38,20,-10.1]) rotate([0,90,180]) cylinder(r=6,h=34);
    translate([-1,20,-9.1]) rotate([0,90,0]) cylinder(r=6,h=50);
    translate([-4,0,-1]) rotate([0,180,0]) boltHole(5,length=50);
}





module zmotor()
{
   difference(){
       zmotor_body();
       zmotor_cuts();
       }
}


zmotor();
